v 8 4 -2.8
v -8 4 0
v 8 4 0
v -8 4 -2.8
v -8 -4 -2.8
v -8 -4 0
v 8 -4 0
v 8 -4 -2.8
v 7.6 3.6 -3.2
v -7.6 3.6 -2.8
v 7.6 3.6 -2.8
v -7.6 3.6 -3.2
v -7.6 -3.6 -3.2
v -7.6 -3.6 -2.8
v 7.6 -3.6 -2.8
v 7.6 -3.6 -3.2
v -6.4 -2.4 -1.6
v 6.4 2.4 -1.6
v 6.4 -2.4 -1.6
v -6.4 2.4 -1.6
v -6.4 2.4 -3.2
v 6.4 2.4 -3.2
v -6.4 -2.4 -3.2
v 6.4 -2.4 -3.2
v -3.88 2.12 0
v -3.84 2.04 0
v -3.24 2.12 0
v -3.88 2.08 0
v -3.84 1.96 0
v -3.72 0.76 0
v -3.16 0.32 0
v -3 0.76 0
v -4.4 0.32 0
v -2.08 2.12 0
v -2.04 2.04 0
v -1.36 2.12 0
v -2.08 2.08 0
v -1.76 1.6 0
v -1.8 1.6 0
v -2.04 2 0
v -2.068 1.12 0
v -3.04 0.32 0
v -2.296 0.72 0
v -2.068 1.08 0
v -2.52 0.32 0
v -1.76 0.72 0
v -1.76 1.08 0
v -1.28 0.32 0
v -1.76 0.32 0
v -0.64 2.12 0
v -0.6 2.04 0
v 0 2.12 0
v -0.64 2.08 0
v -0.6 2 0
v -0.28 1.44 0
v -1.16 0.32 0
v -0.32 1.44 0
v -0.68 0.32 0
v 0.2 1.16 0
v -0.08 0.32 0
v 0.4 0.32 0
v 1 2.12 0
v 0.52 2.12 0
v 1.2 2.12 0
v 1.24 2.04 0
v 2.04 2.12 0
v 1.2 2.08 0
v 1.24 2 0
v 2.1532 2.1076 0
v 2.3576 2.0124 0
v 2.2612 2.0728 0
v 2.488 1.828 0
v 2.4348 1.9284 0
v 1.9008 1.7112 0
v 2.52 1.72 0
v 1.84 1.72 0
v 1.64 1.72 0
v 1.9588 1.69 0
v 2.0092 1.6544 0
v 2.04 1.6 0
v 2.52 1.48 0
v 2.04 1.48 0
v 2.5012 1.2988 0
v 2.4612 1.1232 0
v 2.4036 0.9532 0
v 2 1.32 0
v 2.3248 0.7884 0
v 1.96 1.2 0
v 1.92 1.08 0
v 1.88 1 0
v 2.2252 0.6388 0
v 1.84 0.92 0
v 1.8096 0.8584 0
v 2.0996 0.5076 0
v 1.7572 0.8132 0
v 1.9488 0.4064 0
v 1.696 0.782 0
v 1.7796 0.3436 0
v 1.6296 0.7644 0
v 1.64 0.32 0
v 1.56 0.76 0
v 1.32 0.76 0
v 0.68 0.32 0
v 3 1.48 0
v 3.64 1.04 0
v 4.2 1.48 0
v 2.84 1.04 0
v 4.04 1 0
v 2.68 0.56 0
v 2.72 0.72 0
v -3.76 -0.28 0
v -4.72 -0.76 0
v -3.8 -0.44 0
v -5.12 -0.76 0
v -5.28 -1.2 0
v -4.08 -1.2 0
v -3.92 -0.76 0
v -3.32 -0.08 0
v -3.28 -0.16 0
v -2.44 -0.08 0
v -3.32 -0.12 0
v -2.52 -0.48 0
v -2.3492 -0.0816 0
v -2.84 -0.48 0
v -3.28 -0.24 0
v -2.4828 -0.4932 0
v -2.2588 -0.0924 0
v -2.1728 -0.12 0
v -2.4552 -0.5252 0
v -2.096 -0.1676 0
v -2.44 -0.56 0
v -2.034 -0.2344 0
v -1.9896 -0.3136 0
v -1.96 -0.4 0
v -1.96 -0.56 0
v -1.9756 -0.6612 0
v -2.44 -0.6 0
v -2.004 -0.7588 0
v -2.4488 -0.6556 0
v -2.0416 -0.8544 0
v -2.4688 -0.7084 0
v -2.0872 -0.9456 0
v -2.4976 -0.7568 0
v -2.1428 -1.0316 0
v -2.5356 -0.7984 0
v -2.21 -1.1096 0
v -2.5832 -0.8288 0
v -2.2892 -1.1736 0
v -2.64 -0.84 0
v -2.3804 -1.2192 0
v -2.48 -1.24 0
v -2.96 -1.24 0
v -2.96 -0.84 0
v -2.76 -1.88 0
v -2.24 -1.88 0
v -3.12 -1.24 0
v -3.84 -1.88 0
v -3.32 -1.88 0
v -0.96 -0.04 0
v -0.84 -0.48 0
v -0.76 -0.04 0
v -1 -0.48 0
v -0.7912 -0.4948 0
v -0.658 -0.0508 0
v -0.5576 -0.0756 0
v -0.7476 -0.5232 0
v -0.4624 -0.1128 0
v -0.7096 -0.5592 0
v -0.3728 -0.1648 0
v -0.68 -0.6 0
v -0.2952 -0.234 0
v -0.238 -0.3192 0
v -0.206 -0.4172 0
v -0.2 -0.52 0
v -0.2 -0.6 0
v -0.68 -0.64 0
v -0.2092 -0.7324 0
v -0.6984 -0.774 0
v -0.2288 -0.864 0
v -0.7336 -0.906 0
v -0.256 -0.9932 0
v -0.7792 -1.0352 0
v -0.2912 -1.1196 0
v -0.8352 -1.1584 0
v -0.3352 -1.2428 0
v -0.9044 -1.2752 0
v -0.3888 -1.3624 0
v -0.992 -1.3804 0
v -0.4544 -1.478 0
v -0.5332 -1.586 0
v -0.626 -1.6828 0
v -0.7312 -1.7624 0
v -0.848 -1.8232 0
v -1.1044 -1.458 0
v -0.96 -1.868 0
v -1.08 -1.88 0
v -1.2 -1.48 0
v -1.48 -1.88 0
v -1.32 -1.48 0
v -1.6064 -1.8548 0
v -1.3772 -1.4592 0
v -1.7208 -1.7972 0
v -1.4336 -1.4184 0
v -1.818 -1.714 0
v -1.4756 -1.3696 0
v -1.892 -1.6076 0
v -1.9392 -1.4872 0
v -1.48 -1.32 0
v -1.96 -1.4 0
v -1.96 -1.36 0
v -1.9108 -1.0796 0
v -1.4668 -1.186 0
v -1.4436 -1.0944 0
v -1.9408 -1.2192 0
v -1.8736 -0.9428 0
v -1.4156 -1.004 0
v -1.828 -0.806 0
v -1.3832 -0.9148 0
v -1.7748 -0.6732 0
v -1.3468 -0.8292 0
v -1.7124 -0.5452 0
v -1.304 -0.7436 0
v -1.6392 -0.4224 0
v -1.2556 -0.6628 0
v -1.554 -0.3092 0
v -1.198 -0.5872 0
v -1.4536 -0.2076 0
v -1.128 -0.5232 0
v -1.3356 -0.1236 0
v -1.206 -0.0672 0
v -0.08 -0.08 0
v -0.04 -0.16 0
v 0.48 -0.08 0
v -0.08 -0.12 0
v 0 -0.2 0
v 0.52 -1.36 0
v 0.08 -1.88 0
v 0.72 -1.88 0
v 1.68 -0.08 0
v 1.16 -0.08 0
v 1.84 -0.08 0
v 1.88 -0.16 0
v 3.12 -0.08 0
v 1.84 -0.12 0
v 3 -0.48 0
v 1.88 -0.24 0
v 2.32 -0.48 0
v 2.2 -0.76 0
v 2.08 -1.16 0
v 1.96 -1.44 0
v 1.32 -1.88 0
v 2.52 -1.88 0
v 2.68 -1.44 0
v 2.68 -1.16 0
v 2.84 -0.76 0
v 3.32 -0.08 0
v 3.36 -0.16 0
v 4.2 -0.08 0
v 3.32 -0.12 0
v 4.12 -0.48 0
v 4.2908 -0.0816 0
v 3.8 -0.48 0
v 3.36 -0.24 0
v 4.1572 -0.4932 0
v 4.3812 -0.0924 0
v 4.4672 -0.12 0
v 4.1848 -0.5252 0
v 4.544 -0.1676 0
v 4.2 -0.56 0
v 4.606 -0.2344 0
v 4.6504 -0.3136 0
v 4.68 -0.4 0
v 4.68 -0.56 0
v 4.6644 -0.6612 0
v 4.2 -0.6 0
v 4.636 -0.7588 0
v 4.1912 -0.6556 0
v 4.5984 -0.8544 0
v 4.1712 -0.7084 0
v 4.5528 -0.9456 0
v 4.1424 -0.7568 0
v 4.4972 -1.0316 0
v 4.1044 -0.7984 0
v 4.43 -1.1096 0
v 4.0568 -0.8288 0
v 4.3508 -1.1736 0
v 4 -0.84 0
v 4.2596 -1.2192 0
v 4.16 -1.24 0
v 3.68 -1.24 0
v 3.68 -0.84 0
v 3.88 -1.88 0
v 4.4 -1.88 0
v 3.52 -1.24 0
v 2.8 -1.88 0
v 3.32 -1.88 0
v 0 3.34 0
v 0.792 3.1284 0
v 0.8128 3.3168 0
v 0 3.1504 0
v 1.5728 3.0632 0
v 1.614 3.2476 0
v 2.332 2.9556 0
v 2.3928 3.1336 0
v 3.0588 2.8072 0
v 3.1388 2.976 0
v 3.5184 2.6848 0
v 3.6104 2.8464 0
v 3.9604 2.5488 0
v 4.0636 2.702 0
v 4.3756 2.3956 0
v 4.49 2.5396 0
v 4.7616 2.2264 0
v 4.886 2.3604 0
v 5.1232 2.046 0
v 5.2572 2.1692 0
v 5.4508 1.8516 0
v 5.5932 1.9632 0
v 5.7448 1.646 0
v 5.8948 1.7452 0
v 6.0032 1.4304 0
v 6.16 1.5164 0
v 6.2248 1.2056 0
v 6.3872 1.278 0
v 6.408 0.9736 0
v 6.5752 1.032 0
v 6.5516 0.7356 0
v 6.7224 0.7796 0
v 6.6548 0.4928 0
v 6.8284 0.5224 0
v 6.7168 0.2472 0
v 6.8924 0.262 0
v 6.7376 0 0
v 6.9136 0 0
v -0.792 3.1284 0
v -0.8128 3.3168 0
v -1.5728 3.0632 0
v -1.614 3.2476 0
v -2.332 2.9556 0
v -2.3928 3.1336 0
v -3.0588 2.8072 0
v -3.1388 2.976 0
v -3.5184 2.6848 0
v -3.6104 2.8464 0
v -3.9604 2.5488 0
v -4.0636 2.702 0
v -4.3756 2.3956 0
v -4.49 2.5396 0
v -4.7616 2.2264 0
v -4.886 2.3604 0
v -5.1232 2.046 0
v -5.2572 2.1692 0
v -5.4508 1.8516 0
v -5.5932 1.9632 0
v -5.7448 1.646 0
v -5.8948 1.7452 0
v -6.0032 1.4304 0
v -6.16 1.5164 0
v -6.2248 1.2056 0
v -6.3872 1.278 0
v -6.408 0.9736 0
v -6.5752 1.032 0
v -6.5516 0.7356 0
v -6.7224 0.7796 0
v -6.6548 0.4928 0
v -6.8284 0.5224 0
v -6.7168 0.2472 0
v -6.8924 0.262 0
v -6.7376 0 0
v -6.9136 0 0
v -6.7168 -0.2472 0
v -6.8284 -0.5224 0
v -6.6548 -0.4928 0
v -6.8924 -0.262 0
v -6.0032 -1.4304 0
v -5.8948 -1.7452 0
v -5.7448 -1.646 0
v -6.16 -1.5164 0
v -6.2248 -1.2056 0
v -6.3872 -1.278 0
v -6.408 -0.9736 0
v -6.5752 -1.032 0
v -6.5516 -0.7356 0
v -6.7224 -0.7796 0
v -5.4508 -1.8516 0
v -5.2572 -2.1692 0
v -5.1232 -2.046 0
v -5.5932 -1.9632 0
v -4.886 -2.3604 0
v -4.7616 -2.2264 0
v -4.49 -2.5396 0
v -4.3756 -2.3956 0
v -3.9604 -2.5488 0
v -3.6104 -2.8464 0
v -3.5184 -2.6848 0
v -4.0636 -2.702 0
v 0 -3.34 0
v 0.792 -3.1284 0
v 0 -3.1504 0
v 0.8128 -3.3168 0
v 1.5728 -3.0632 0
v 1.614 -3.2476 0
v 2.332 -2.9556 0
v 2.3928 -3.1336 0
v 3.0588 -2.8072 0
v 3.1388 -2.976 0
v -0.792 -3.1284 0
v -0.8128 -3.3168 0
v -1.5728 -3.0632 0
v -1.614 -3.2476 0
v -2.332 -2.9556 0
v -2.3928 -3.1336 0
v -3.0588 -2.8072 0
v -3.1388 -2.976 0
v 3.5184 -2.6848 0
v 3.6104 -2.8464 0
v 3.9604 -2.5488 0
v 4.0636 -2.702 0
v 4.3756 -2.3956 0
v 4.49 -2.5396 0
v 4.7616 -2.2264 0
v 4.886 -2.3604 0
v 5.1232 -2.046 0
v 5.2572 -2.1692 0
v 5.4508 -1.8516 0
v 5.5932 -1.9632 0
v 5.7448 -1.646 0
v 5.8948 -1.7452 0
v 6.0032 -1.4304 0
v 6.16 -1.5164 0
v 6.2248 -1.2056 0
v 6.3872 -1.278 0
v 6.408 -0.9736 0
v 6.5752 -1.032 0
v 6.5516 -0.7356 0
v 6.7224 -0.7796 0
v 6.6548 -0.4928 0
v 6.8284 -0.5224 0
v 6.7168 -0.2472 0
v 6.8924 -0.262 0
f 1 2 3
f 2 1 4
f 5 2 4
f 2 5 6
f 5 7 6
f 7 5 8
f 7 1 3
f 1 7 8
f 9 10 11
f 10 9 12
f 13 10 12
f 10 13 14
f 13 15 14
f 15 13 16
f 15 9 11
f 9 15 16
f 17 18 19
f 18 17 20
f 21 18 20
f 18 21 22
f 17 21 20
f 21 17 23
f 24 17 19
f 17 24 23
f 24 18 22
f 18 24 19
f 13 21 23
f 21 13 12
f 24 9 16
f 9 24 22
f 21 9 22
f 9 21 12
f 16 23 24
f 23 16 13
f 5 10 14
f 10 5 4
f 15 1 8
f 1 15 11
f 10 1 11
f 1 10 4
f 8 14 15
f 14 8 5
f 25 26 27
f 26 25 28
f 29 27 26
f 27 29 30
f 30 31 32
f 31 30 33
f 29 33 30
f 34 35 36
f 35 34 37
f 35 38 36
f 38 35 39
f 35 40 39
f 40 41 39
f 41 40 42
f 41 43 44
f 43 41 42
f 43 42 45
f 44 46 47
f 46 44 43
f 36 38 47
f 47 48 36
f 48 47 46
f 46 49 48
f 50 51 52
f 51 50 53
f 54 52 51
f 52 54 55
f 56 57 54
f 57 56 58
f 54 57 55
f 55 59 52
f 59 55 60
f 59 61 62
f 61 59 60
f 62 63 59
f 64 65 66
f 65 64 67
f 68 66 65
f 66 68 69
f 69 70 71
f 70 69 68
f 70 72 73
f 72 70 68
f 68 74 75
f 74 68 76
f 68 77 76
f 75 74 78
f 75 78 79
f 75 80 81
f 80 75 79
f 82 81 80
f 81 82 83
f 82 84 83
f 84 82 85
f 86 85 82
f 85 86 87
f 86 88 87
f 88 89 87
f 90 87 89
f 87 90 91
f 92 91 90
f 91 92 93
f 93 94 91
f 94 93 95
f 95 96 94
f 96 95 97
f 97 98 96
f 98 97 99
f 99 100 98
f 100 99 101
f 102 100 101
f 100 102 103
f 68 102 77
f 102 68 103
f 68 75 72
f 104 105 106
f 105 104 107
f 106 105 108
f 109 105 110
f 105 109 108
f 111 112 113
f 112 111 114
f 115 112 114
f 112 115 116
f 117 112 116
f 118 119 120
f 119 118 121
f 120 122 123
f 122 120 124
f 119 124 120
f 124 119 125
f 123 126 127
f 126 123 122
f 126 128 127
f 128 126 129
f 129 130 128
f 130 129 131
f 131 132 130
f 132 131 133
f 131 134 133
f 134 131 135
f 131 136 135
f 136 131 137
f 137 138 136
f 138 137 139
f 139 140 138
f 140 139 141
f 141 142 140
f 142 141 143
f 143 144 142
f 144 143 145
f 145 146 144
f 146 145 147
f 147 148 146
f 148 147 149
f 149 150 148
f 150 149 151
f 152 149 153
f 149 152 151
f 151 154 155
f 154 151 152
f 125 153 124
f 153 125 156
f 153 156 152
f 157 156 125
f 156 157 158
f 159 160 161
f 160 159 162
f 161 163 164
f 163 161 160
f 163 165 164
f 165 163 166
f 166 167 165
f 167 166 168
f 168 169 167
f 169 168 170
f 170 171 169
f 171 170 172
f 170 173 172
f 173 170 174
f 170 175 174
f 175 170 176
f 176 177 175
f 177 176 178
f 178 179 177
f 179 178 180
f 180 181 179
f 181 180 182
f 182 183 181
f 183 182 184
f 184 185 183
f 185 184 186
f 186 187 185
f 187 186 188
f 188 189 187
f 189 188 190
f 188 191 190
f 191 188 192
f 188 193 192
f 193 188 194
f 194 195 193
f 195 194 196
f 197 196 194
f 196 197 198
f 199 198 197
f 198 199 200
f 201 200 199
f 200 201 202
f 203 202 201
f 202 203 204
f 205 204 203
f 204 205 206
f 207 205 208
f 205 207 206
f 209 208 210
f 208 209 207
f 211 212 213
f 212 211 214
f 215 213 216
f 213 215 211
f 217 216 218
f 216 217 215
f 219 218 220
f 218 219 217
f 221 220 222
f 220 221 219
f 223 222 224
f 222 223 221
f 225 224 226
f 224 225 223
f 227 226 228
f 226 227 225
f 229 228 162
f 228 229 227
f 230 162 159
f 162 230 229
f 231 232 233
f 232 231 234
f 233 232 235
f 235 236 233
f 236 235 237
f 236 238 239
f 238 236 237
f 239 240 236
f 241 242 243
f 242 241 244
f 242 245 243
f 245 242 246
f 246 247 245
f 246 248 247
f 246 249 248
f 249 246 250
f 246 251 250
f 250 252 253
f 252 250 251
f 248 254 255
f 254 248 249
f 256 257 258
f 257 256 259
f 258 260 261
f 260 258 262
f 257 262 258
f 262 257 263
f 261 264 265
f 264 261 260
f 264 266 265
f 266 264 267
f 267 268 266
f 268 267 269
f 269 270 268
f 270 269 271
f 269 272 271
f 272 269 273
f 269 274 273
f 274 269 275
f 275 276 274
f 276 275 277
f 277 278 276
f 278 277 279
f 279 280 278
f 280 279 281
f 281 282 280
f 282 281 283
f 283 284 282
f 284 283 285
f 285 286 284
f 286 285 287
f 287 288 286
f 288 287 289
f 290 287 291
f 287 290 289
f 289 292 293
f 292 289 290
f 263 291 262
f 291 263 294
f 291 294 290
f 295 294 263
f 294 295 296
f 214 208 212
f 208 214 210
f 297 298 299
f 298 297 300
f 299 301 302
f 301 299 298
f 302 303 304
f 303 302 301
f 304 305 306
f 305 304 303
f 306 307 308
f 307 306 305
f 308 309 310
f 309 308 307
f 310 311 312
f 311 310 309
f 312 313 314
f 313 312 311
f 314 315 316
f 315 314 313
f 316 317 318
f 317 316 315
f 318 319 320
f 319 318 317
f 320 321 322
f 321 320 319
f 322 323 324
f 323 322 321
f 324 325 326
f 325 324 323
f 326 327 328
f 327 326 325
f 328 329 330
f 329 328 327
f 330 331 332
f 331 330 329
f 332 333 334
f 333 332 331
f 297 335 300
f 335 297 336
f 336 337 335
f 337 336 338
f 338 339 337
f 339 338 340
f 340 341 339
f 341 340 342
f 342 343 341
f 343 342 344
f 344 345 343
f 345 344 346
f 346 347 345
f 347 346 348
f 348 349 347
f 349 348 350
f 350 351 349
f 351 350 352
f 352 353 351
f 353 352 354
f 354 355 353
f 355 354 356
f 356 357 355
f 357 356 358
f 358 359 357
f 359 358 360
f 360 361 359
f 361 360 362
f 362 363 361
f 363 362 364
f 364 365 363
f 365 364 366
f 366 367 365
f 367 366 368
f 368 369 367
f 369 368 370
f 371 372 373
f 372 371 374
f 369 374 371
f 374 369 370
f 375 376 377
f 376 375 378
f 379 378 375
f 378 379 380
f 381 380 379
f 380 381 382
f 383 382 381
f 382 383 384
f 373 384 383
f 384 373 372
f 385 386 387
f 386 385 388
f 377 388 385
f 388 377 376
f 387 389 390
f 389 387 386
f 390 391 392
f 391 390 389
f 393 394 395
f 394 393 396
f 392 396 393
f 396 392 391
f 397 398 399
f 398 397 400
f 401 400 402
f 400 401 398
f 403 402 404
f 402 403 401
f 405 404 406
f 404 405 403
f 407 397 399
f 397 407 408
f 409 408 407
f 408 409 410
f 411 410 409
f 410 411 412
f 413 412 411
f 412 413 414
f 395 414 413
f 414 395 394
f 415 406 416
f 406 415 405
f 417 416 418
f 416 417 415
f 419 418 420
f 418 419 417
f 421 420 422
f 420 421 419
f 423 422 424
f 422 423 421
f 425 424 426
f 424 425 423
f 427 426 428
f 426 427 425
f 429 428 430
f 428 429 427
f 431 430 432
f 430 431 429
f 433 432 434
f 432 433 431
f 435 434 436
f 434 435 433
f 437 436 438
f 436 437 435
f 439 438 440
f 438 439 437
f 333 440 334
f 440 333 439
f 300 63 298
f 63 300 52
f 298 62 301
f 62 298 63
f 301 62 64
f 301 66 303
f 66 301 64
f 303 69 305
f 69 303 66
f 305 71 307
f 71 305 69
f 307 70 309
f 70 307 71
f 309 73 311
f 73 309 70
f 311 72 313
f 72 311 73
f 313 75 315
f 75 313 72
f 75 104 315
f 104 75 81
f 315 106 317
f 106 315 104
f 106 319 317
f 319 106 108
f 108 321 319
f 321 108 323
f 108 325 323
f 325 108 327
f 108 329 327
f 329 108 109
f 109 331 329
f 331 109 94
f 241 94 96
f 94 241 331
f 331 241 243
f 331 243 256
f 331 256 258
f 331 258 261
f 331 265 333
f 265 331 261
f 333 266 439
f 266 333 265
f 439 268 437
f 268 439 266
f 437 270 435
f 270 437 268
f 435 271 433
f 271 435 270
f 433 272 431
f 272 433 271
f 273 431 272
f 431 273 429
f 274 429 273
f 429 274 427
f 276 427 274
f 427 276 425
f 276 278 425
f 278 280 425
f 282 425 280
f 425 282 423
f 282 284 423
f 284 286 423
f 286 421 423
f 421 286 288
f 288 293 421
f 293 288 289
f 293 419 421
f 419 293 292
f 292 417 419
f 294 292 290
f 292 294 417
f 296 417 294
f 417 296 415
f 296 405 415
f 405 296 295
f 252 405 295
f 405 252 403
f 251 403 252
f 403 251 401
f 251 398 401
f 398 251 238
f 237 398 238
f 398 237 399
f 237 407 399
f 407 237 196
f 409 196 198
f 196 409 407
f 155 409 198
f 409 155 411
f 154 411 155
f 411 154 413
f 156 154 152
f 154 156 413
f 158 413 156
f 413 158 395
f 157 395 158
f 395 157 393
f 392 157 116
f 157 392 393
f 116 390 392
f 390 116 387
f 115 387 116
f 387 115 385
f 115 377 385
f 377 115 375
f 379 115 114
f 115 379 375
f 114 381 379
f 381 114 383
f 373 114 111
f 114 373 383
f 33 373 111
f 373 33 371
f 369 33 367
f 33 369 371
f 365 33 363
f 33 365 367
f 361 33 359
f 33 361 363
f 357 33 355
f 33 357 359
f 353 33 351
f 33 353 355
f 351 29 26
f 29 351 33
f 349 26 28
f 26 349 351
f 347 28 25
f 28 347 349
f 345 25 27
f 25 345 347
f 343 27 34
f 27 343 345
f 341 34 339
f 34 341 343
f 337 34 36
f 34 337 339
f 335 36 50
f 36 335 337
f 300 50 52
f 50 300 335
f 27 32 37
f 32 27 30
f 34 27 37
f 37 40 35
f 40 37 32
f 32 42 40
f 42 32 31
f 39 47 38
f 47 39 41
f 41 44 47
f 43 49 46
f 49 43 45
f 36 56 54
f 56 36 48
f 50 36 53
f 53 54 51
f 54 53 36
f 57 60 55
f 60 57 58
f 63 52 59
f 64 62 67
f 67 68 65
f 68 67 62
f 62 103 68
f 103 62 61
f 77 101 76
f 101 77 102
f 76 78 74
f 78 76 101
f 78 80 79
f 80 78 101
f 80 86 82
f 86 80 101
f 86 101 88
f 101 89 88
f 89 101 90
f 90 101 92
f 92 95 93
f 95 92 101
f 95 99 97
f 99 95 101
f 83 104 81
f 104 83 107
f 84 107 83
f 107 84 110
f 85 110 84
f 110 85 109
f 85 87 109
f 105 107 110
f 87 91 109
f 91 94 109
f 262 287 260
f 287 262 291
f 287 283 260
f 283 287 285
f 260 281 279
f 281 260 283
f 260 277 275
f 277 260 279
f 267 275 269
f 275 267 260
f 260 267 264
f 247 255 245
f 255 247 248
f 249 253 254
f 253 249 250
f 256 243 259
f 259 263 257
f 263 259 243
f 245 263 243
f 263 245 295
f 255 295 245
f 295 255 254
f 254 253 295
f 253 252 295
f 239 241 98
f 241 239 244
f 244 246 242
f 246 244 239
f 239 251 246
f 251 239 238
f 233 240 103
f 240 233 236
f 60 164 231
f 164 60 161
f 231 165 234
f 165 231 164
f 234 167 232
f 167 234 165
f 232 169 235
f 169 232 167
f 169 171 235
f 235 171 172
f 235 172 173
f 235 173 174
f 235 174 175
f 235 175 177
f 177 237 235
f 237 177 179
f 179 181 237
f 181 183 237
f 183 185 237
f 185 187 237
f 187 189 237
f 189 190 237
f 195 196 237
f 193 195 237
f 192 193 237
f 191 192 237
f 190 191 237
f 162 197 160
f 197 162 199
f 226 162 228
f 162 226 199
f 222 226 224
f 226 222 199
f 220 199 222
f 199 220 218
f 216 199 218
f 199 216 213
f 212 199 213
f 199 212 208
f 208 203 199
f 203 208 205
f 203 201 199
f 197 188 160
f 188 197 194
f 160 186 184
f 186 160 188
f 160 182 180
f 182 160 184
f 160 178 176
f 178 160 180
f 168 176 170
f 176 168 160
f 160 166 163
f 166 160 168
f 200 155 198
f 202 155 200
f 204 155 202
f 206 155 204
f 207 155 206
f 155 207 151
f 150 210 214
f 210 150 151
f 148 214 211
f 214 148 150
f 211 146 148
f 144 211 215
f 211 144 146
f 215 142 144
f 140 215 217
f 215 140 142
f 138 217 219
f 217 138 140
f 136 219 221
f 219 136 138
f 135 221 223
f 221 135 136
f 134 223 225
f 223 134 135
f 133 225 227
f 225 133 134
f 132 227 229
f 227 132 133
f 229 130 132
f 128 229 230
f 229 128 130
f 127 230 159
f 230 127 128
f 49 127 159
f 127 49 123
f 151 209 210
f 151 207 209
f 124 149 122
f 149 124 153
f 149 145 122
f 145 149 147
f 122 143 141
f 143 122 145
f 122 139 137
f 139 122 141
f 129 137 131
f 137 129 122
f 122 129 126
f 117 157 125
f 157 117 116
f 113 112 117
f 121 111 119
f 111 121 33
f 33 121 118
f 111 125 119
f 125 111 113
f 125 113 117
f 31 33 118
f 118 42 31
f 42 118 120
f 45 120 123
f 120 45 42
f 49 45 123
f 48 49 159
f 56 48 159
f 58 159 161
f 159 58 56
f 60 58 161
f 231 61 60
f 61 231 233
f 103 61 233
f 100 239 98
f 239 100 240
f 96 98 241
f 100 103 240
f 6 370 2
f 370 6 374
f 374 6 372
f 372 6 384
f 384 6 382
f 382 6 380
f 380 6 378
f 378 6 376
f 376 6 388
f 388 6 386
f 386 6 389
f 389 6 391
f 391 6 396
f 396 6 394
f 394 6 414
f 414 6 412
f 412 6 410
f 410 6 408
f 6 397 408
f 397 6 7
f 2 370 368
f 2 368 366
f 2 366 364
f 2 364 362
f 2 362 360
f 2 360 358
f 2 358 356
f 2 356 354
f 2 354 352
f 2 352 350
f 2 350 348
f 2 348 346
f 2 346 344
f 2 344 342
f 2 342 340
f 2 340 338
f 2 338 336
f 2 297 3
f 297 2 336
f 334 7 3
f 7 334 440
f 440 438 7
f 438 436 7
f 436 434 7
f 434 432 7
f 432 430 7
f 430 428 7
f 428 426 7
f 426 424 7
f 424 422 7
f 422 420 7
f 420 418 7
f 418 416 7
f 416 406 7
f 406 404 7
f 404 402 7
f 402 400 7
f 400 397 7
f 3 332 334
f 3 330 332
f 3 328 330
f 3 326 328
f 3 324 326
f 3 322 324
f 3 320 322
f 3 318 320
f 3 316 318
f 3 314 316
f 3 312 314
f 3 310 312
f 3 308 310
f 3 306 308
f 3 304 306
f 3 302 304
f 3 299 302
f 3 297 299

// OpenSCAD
use <../lib.scad>
use <../p/logo-landrover.scad>
use <s/3069bs01.scad>
function ldraw_lib__3069bpt3() = [
// 0 Tile  1 x  2 with Groove with Land Rover Logo Pattern
// 0 Name: 3069bpt3.dat
// 0 Author: Florent Faramond [Makou]
// 0 !LDRAW_ORG Part UPDATE 2024-01
// 0 !LICENSE Licensed under CC BY 4.0 : see CAreadme.txt
// 
// 0 BFC CERTIFY CCW
  [0,"BFC","CERTIFY"],
  [0,"BFC","CCW"],
// 
// 0 !KEYWORDS BrickLink 3069pb1147, Defender 90, Land Rover
// 0 !KEYWORDS Rebrickable 3069bpr0375, Set 10317
// 
// 0 !HISTORY 2024-01-29 [OrionP] Official Update 2024-01
// 
// 
// 1 16 0 0 0 1 0 0 0 1 0 0 0 1 s\3069bs01.dat
  [1,16,0,0,0,1,0,0,0,1,0,0,0,1, ldraw_lib__s__3069bs01()],
// 1 16 0 0 0 1 0 0 0 1 0 0 0 1 logo-landrover.dat
  [1,16,0,0,0,1,0,0,0,1,0,0,0,1, ldraw_lib__logo_landrover()],
// 4 16 -20 0 -10 -17.231 0 -0.655 -17.284 0 0 -20 0 10
  [4,16,-20,0,-10,-17.231,0,-0.655,-17.284,0,0,-20,0,10],
// 3 16 -17.231 0 -0.655 -20 0 -10 -17.071 0 -1.306
  [3,16,-17.231,0,-0.655,-20,0,-10,-17.071,0,-1.306],
// 3 16 -17.071 0 -1.306 -20 0 -10 -16.806 0 -1.949
  [3,16,-17.071,0,-1.306,-20,0,-10,-16.806,0,-1.949],
// 3 16 -16.806 0 -1.949 -20 0 -10 -16.438 0 -2.58
  [3,16,-16.806,0,-1.949,-20,0,-10,-16.438,0,-2.58],
// 3 16 -16.438 0 -2.58 -20 0 -10 -15.968 0 -3.195
  [3,16,-16.438,0,-2.58,-20,0,-10,-15.968,0,-3.195],
// 3 16 -15.968 0 -3.195 -20 0 -10 -15.4 0 -3.791
  [3,16,-15.968,0,-3.195,-20,0,-10,-15.4,0,-3.791],
// 3 16 -15.4 0 -3.791 -20 0 -10 -14.737 0 -4.363
  [3,16,-15.4,0,-3.791,-20,0,-10,-14.737,0,-4.363],
// 3 16 -14.737 0 -4.363 -20 0 -10 -13.983 0 -4.908
  [3,16,-14.737,0,-4.363,-20,0,-10,-13.983,0,-4.908],
// 3 16 -13.983 0 -4.908 -20 0 -10 -13.143 0 -5.423
  [3,16,-13.983,0,-4.908,-20,0,-10,-13.143,0,-5.423],
// 3 16 -13.143 0 -5.423 -20 0 -10 -12.215 0 -5.901
  [3,16,-13.143,0,-5.423,-20,0,-10,-12.215,0,-5.901],
// 3 16 -12.215 0 -5.901 -20 0 -10 -11.225 0 -6.349
  [3,16,-12.215,0,-5.901,-20,0,-10,-11.225,0,-6.349],
// 3 16 -11.225 0 -6.349 -20 0 -10 -10.159 0 -6.755
  [3,16,-11.225,0,-6.349,-20,0,-10,-10.159,0,-6.755],
// 3 16 -10.159 0 -6.755 -20 0 -10 -9.026 0 -7.116
  [3,16,-10.159,0,-6.755,-20,0,-10,-9.026,0,-7.116],
// 3 16 -9.026 0 -7.116 -20 0 -10 -7.847 0 -7.44
  [3,16,-9.026,0,-7.116,-20,0,-10,-7.847,0,-7.44],
// 3 16 -7.847 0 -7.44 -20 0 -10 -5.982 0 -7.834
  [3,16,-7.847,0,-7.44,-20,0,-10,-5.982,0,-7.834],
// 3 16 -5.982 0 -7.834 -20 0 -10 -4.035 0 -8.119
  [3,16,-5.982,0,-7.834,-20,0,-10,-4.035,0,-8.119],
// 3 16 -4.035 0 -8.119 -20 0 -10 -2.032 0 -8.292
  [3,16,-4.035,0,-8.119,-20,0,-10,-2.032,0,-8.292],
// 4 16 0 0 -8.35 -2.032 0 -8.292 -20 0 -10 20 0 -10
  [4,16,0,0,-8.35,-2.032,0,-8.292,-20,0,-10,20,0,-10],
// 3 16 -20 0 10 -17.284 0 0 -17.231 0 0.655
  [3,16,-20,0,10,-17.284,0,0,-17.231,0,0.655],
// 3 16 -20 0 10 -17.231 0 0.655 -17.071 0 1.306
  [3,16,-20,0,10,-17.231,0,0.655,-17.071,0,1.306],
// 3 16 -20 0 10 -17.071 0 1.306 -16.806 0 1.949
  [3,16,-20,0,10,-17.071,0,1.306,-16.806,0,1.949],
// 3 16 -20 0 10 -16.806 0 1.949 -16.438 0 2.58
  [3,16,-20,0,10,-16.806,0,1.949,-16.438,0,2.58],
// 3 16 -20 0 10 -16.438 0 2.58 -15.968 0 3.195
  [3,16,-20,0,10,-16.438,0,2.58,-15.968,0,3.195],
// 3 16 -20 0 10 -15.968 0 3.195 -15.4 0 3.791
  [3,16,-20,0,10,-15.968,0,3.195,-15.4,0,3.791],
// 3 16 -20 0 10 -15.4 0 3.791 -14.737 0 4.363
  [3,16,-20,0,10,-15.4,0,3.791,-14.737,0,4.363],
// 3 16 -20 0 10 -14.737 0 4.363 -13.983 0 4.908
  [3,16,-20,0,10,-14.737,0,4.363,-13.983,0,4.908],
// 3 16 -20 0 10 -13.983 0 4.908 -13.143 0 5.423
  [3,16,-20,0,10,-13.983,0,4.908,-13.143,0,5.423],
// 3 16 -20 0 10 -13.143 0 5.423 -12.215 0 5.901
  [3,16,-20,0,10,-13.143,0,5.423,-12.215,0,5.901],
// 3 16 -20 0 10 -12.215 0 5.901 -11.225 0 6.349
  [3,16,-20,0,10,-12.215,0,5.901,-11.225,0,6.349],
// 3 16 -20 0 10 -11.225 0 6.349 -10.159 0 6.755
  [3,16,-20,0,10,-11.225,0,6.349,-10.159,0,6.755],
// 3 16 -20 0 10 -10.159 0 6.755 -9.026 0 7.116
  [3,16,-20,0,10,-10.159,0,6.755,-9.026,0,7.116],
// 3 16 -20 0 10 -9.026 0 7.116 -7.847 0 7.44
  [3,16,-20,0,10,-9.026,0,7.116,-7.847,0,7.44],
// 3 16 -20 0 10 -7.847 0 7.44 -5.982 0 7.834
  [3,16,-20,0,10,-7.847,0,7.44,-5.982,0,7.834],
// 3 16 -20 0 10 -5.982 0 7.834 -4.035 0 8.119
  [3,16,-20,0,10,-5.982,0,7.834,-4.035,0,8.119],
// 3 16 -20 0 10 -4.035 0 8.119 -2.032 0 8.292
  [3,16,-20,0,10,-4.035,0,8.119,-2.032,0,8.292],
// 4 16 -20 0 10 -2.032 0 8.292 0 0 8.35 20 0 10
  [4,16,-20,0,10,-2.032,0,8.292,0,0,8.35,20,0,10],
// 4 16 17.284 0 0 17.231 0 -0.655 20 0 -10 20 0 10
  [4,16,17.284,0,0,17.231,0,-0.655,20,0,-10,20,0,10],
// 3 16 17.231 0 -0.655 17.071 0 -1.306 20 0 -10
  [3,16,17.231,0,-0.655,17.071,0,-1.306,20,0,-10],
// 3 16 17.071 0 -1.306 16.806 0 -1.949 20 0 -10
  [3,16,17.071,0,-1.306,16.806,0,-1.949,20,0,-10],
// 3 16 16.806 0 -1.949 16.438 0 -2.58 20 0 -10
  [3,16,16.806,0,-1.949,16.438,0,-2.58,20,0,-10],
// 3 16 16.438 0 -2.58 15.968 0 -3.195 20 0 -10
  [3,16,16.438,0,-2.58,15.968,0,-3.195,20,0,-10],
// 3 16 15.968 0 -3.195 15.4 0 -3.791 20 0 -10
  [3,16,15.968,0,-3.195,15.4,0,-3.791,20,0,-10],
// 3 16 15.4 0 -3.791 14.737 0 -4.363 20 0 -10
  [3,16,15.4,0,-3.791,14.737,0,-4.363,20,0,-10],
// 3 16 14.737 0 -4.363 13.983 0 -4.908 20 0 -10
  [3,16,14.737,0,-4.363,13.983,0,-4.908,20,0,-10],
// 3 16 13.983 0 -4.908 13.143 0 -5.423 20 0 -10
  [3,16,13.983,0,-4.908,13.143,0,-5.423,20,0,-10],
// 3 16 13.143 0 -5.423 12.215 0 -5.901 20 0 -10
  [3,16,13.143,0,-5.423,12.215,0,-5.901,20,0,-10],
// 3 16 12.215 0 -5.901 11.225 0 -6.349 20 0 -10
  [3,16,12.215,0,-5.901,11.225,0,-6.349,20,0,-10],
// 3 16 11.225 0 -6.349 10.159 0 -6.755 20 0 -10
  [3,16,11.225,0,-6.349,10.159,0,-6.755,20,0,-10],
// 3 16 10.159 0 -6.755 9.026 0 -7.116 20 0 -10
  [3,16,10.159,0,-6.755,9.026,0,-7.116,20,0,-10],
// 3 16 9.026 0 -7.116 7.847 0 -7.44 20 0 -10
  [3,16,9.026,0,-7.116,7.847,0,-7.44,20,0,-10],
// 3 16 7.847 0 -7.44 5.982 0 -7.834 20 0 -10
  [3,16,7.847,0,-7.44,5.982,0,-7.834,20,0,-10],
// 3 16 5.982 0 -7.834 4.035 0 -8.119 20 0 -10
  [3,16,5.982,0,-7.834,4.035,0,-8.119,20,0,-10],
// 3 16 4.035 0 -8.119 2.032 0 -8.292 20 0 -10
  [3,16,4.035,0,-8.119,2.032,0,-8.292,20,0,-10],
// 3 16 2.032 0 -8.292 0 0 -8.35 20 0 -10
  [3,16,2.032,0,-8.292,0,0,-8.35,20,0,-10],
// 3 16 20 0 10 17.231 0 0.655 17.284 0 0
  [3,16,20,0,10,17.231,0,0.655,17.284,0,0],
// 3 16 20 0 10 17.071 0 1.306 17.231 0 0.655
  [3,16,20,0,10,17.071,0,1.306,17.231,0,0.655],
// 3 16 20 0 10 16.806 0 1.949 17.071 0 1.306
  [3,16,20,0,10,16.806,0,1.949,17.071,0,1.306],
// 3 16 20 0 10 16.438 0 2.58 16.806 0 1.949
  [3,16,20,0,10,16.438,0,2.58,16.806,0,1.949],
// 3 16 20 0 10 15.968 0 3.195 16.438 0 2.58
  [3,16,20,0,10,15.968,0,3.195,16.438,0,2.58],
// 3 16 20 0 10 15.4 0 3.791 15.968 0 3.195
  [3,16,20,0,10,15.4,0,3.791,15.968,0,3.195],
// 3 16 20 0 10 14.737 0 4.363 15.4 0 3.791
  [3,16,20,0,10,14.737,0,4.363,15.4,0,3.791],
// 3 16 20 0 10 13.983 0 4.908 14.737 0 4.363
  [3,16,20,0,10,13.983,0,4.908,14.737,0,4.363],
// 3 16 20 0 10 13.143 0 5.423 13.983 0 4.908
  [3,16,20,0,10,13.143,0,5.423,13.983,0,4.908],
// 3 16 20 0 10 12.215 0 5.901 13.143 0 5.423
  [3,16,20,0,10,12.215,0,5.901,13.143,0,5.423],
// 3 16 20 0 10 11.225 0 6.349 12.215 0 5.901
  [3,16,20,0,10,11.225,0,6.349,12.215,0,5.901],
// 3 16 20 0 10 10.159 0 6.755 11.225 0 6.349
  [3,16,20,0,10,10.159,0,6.755,11.225,0,6.349],
// 3 16 20 0 10 9.026 0 7.116 10.159 0 6.755
  [3,16,20,0,10,9.026,0,7.116,10.159,0,6.755],
// 3 16 20 0 10 7.847 0 7.44 9.026 0 7.116
  [3,16,20,0,10,7.847,0,7.44,9.026,0,7.116],
// 3 16 20 0 10 5.982 0 7.834 7.847 0 7.44
  [3,16,20,0,10,5.982,0,7.834,7.847,0,7.44],
// 3 16 20 0 10 4.035 0 8.119 5.982 0 7.834
  [3,16,20,0,10,4.035,0,8.119,5.982,0,7.834],
// 3 16 20 0 10 2.032 0 8.292 4.035 0 8.119
  [3,16,20,0,10,2.032,0,8.292,4.035,0,8.119],
// 3 16 20 0 10 0 0 8.35 2.032 0 8.292
  [3,16,20,0,10,0,0,8.35,2.032,0,8.292],
];
module ldraw_lib__3069bpt3(step=0, col=false, unit=2/5, alt=false, line=0.2, solid=!$preview)
    makepoly(ldraw_lib__3069bpt3(), step=step, col=col, unit=unit, alt=alt, line=line, solid=solid);
ldraw_lib__3069bpt3(line=0.2);
